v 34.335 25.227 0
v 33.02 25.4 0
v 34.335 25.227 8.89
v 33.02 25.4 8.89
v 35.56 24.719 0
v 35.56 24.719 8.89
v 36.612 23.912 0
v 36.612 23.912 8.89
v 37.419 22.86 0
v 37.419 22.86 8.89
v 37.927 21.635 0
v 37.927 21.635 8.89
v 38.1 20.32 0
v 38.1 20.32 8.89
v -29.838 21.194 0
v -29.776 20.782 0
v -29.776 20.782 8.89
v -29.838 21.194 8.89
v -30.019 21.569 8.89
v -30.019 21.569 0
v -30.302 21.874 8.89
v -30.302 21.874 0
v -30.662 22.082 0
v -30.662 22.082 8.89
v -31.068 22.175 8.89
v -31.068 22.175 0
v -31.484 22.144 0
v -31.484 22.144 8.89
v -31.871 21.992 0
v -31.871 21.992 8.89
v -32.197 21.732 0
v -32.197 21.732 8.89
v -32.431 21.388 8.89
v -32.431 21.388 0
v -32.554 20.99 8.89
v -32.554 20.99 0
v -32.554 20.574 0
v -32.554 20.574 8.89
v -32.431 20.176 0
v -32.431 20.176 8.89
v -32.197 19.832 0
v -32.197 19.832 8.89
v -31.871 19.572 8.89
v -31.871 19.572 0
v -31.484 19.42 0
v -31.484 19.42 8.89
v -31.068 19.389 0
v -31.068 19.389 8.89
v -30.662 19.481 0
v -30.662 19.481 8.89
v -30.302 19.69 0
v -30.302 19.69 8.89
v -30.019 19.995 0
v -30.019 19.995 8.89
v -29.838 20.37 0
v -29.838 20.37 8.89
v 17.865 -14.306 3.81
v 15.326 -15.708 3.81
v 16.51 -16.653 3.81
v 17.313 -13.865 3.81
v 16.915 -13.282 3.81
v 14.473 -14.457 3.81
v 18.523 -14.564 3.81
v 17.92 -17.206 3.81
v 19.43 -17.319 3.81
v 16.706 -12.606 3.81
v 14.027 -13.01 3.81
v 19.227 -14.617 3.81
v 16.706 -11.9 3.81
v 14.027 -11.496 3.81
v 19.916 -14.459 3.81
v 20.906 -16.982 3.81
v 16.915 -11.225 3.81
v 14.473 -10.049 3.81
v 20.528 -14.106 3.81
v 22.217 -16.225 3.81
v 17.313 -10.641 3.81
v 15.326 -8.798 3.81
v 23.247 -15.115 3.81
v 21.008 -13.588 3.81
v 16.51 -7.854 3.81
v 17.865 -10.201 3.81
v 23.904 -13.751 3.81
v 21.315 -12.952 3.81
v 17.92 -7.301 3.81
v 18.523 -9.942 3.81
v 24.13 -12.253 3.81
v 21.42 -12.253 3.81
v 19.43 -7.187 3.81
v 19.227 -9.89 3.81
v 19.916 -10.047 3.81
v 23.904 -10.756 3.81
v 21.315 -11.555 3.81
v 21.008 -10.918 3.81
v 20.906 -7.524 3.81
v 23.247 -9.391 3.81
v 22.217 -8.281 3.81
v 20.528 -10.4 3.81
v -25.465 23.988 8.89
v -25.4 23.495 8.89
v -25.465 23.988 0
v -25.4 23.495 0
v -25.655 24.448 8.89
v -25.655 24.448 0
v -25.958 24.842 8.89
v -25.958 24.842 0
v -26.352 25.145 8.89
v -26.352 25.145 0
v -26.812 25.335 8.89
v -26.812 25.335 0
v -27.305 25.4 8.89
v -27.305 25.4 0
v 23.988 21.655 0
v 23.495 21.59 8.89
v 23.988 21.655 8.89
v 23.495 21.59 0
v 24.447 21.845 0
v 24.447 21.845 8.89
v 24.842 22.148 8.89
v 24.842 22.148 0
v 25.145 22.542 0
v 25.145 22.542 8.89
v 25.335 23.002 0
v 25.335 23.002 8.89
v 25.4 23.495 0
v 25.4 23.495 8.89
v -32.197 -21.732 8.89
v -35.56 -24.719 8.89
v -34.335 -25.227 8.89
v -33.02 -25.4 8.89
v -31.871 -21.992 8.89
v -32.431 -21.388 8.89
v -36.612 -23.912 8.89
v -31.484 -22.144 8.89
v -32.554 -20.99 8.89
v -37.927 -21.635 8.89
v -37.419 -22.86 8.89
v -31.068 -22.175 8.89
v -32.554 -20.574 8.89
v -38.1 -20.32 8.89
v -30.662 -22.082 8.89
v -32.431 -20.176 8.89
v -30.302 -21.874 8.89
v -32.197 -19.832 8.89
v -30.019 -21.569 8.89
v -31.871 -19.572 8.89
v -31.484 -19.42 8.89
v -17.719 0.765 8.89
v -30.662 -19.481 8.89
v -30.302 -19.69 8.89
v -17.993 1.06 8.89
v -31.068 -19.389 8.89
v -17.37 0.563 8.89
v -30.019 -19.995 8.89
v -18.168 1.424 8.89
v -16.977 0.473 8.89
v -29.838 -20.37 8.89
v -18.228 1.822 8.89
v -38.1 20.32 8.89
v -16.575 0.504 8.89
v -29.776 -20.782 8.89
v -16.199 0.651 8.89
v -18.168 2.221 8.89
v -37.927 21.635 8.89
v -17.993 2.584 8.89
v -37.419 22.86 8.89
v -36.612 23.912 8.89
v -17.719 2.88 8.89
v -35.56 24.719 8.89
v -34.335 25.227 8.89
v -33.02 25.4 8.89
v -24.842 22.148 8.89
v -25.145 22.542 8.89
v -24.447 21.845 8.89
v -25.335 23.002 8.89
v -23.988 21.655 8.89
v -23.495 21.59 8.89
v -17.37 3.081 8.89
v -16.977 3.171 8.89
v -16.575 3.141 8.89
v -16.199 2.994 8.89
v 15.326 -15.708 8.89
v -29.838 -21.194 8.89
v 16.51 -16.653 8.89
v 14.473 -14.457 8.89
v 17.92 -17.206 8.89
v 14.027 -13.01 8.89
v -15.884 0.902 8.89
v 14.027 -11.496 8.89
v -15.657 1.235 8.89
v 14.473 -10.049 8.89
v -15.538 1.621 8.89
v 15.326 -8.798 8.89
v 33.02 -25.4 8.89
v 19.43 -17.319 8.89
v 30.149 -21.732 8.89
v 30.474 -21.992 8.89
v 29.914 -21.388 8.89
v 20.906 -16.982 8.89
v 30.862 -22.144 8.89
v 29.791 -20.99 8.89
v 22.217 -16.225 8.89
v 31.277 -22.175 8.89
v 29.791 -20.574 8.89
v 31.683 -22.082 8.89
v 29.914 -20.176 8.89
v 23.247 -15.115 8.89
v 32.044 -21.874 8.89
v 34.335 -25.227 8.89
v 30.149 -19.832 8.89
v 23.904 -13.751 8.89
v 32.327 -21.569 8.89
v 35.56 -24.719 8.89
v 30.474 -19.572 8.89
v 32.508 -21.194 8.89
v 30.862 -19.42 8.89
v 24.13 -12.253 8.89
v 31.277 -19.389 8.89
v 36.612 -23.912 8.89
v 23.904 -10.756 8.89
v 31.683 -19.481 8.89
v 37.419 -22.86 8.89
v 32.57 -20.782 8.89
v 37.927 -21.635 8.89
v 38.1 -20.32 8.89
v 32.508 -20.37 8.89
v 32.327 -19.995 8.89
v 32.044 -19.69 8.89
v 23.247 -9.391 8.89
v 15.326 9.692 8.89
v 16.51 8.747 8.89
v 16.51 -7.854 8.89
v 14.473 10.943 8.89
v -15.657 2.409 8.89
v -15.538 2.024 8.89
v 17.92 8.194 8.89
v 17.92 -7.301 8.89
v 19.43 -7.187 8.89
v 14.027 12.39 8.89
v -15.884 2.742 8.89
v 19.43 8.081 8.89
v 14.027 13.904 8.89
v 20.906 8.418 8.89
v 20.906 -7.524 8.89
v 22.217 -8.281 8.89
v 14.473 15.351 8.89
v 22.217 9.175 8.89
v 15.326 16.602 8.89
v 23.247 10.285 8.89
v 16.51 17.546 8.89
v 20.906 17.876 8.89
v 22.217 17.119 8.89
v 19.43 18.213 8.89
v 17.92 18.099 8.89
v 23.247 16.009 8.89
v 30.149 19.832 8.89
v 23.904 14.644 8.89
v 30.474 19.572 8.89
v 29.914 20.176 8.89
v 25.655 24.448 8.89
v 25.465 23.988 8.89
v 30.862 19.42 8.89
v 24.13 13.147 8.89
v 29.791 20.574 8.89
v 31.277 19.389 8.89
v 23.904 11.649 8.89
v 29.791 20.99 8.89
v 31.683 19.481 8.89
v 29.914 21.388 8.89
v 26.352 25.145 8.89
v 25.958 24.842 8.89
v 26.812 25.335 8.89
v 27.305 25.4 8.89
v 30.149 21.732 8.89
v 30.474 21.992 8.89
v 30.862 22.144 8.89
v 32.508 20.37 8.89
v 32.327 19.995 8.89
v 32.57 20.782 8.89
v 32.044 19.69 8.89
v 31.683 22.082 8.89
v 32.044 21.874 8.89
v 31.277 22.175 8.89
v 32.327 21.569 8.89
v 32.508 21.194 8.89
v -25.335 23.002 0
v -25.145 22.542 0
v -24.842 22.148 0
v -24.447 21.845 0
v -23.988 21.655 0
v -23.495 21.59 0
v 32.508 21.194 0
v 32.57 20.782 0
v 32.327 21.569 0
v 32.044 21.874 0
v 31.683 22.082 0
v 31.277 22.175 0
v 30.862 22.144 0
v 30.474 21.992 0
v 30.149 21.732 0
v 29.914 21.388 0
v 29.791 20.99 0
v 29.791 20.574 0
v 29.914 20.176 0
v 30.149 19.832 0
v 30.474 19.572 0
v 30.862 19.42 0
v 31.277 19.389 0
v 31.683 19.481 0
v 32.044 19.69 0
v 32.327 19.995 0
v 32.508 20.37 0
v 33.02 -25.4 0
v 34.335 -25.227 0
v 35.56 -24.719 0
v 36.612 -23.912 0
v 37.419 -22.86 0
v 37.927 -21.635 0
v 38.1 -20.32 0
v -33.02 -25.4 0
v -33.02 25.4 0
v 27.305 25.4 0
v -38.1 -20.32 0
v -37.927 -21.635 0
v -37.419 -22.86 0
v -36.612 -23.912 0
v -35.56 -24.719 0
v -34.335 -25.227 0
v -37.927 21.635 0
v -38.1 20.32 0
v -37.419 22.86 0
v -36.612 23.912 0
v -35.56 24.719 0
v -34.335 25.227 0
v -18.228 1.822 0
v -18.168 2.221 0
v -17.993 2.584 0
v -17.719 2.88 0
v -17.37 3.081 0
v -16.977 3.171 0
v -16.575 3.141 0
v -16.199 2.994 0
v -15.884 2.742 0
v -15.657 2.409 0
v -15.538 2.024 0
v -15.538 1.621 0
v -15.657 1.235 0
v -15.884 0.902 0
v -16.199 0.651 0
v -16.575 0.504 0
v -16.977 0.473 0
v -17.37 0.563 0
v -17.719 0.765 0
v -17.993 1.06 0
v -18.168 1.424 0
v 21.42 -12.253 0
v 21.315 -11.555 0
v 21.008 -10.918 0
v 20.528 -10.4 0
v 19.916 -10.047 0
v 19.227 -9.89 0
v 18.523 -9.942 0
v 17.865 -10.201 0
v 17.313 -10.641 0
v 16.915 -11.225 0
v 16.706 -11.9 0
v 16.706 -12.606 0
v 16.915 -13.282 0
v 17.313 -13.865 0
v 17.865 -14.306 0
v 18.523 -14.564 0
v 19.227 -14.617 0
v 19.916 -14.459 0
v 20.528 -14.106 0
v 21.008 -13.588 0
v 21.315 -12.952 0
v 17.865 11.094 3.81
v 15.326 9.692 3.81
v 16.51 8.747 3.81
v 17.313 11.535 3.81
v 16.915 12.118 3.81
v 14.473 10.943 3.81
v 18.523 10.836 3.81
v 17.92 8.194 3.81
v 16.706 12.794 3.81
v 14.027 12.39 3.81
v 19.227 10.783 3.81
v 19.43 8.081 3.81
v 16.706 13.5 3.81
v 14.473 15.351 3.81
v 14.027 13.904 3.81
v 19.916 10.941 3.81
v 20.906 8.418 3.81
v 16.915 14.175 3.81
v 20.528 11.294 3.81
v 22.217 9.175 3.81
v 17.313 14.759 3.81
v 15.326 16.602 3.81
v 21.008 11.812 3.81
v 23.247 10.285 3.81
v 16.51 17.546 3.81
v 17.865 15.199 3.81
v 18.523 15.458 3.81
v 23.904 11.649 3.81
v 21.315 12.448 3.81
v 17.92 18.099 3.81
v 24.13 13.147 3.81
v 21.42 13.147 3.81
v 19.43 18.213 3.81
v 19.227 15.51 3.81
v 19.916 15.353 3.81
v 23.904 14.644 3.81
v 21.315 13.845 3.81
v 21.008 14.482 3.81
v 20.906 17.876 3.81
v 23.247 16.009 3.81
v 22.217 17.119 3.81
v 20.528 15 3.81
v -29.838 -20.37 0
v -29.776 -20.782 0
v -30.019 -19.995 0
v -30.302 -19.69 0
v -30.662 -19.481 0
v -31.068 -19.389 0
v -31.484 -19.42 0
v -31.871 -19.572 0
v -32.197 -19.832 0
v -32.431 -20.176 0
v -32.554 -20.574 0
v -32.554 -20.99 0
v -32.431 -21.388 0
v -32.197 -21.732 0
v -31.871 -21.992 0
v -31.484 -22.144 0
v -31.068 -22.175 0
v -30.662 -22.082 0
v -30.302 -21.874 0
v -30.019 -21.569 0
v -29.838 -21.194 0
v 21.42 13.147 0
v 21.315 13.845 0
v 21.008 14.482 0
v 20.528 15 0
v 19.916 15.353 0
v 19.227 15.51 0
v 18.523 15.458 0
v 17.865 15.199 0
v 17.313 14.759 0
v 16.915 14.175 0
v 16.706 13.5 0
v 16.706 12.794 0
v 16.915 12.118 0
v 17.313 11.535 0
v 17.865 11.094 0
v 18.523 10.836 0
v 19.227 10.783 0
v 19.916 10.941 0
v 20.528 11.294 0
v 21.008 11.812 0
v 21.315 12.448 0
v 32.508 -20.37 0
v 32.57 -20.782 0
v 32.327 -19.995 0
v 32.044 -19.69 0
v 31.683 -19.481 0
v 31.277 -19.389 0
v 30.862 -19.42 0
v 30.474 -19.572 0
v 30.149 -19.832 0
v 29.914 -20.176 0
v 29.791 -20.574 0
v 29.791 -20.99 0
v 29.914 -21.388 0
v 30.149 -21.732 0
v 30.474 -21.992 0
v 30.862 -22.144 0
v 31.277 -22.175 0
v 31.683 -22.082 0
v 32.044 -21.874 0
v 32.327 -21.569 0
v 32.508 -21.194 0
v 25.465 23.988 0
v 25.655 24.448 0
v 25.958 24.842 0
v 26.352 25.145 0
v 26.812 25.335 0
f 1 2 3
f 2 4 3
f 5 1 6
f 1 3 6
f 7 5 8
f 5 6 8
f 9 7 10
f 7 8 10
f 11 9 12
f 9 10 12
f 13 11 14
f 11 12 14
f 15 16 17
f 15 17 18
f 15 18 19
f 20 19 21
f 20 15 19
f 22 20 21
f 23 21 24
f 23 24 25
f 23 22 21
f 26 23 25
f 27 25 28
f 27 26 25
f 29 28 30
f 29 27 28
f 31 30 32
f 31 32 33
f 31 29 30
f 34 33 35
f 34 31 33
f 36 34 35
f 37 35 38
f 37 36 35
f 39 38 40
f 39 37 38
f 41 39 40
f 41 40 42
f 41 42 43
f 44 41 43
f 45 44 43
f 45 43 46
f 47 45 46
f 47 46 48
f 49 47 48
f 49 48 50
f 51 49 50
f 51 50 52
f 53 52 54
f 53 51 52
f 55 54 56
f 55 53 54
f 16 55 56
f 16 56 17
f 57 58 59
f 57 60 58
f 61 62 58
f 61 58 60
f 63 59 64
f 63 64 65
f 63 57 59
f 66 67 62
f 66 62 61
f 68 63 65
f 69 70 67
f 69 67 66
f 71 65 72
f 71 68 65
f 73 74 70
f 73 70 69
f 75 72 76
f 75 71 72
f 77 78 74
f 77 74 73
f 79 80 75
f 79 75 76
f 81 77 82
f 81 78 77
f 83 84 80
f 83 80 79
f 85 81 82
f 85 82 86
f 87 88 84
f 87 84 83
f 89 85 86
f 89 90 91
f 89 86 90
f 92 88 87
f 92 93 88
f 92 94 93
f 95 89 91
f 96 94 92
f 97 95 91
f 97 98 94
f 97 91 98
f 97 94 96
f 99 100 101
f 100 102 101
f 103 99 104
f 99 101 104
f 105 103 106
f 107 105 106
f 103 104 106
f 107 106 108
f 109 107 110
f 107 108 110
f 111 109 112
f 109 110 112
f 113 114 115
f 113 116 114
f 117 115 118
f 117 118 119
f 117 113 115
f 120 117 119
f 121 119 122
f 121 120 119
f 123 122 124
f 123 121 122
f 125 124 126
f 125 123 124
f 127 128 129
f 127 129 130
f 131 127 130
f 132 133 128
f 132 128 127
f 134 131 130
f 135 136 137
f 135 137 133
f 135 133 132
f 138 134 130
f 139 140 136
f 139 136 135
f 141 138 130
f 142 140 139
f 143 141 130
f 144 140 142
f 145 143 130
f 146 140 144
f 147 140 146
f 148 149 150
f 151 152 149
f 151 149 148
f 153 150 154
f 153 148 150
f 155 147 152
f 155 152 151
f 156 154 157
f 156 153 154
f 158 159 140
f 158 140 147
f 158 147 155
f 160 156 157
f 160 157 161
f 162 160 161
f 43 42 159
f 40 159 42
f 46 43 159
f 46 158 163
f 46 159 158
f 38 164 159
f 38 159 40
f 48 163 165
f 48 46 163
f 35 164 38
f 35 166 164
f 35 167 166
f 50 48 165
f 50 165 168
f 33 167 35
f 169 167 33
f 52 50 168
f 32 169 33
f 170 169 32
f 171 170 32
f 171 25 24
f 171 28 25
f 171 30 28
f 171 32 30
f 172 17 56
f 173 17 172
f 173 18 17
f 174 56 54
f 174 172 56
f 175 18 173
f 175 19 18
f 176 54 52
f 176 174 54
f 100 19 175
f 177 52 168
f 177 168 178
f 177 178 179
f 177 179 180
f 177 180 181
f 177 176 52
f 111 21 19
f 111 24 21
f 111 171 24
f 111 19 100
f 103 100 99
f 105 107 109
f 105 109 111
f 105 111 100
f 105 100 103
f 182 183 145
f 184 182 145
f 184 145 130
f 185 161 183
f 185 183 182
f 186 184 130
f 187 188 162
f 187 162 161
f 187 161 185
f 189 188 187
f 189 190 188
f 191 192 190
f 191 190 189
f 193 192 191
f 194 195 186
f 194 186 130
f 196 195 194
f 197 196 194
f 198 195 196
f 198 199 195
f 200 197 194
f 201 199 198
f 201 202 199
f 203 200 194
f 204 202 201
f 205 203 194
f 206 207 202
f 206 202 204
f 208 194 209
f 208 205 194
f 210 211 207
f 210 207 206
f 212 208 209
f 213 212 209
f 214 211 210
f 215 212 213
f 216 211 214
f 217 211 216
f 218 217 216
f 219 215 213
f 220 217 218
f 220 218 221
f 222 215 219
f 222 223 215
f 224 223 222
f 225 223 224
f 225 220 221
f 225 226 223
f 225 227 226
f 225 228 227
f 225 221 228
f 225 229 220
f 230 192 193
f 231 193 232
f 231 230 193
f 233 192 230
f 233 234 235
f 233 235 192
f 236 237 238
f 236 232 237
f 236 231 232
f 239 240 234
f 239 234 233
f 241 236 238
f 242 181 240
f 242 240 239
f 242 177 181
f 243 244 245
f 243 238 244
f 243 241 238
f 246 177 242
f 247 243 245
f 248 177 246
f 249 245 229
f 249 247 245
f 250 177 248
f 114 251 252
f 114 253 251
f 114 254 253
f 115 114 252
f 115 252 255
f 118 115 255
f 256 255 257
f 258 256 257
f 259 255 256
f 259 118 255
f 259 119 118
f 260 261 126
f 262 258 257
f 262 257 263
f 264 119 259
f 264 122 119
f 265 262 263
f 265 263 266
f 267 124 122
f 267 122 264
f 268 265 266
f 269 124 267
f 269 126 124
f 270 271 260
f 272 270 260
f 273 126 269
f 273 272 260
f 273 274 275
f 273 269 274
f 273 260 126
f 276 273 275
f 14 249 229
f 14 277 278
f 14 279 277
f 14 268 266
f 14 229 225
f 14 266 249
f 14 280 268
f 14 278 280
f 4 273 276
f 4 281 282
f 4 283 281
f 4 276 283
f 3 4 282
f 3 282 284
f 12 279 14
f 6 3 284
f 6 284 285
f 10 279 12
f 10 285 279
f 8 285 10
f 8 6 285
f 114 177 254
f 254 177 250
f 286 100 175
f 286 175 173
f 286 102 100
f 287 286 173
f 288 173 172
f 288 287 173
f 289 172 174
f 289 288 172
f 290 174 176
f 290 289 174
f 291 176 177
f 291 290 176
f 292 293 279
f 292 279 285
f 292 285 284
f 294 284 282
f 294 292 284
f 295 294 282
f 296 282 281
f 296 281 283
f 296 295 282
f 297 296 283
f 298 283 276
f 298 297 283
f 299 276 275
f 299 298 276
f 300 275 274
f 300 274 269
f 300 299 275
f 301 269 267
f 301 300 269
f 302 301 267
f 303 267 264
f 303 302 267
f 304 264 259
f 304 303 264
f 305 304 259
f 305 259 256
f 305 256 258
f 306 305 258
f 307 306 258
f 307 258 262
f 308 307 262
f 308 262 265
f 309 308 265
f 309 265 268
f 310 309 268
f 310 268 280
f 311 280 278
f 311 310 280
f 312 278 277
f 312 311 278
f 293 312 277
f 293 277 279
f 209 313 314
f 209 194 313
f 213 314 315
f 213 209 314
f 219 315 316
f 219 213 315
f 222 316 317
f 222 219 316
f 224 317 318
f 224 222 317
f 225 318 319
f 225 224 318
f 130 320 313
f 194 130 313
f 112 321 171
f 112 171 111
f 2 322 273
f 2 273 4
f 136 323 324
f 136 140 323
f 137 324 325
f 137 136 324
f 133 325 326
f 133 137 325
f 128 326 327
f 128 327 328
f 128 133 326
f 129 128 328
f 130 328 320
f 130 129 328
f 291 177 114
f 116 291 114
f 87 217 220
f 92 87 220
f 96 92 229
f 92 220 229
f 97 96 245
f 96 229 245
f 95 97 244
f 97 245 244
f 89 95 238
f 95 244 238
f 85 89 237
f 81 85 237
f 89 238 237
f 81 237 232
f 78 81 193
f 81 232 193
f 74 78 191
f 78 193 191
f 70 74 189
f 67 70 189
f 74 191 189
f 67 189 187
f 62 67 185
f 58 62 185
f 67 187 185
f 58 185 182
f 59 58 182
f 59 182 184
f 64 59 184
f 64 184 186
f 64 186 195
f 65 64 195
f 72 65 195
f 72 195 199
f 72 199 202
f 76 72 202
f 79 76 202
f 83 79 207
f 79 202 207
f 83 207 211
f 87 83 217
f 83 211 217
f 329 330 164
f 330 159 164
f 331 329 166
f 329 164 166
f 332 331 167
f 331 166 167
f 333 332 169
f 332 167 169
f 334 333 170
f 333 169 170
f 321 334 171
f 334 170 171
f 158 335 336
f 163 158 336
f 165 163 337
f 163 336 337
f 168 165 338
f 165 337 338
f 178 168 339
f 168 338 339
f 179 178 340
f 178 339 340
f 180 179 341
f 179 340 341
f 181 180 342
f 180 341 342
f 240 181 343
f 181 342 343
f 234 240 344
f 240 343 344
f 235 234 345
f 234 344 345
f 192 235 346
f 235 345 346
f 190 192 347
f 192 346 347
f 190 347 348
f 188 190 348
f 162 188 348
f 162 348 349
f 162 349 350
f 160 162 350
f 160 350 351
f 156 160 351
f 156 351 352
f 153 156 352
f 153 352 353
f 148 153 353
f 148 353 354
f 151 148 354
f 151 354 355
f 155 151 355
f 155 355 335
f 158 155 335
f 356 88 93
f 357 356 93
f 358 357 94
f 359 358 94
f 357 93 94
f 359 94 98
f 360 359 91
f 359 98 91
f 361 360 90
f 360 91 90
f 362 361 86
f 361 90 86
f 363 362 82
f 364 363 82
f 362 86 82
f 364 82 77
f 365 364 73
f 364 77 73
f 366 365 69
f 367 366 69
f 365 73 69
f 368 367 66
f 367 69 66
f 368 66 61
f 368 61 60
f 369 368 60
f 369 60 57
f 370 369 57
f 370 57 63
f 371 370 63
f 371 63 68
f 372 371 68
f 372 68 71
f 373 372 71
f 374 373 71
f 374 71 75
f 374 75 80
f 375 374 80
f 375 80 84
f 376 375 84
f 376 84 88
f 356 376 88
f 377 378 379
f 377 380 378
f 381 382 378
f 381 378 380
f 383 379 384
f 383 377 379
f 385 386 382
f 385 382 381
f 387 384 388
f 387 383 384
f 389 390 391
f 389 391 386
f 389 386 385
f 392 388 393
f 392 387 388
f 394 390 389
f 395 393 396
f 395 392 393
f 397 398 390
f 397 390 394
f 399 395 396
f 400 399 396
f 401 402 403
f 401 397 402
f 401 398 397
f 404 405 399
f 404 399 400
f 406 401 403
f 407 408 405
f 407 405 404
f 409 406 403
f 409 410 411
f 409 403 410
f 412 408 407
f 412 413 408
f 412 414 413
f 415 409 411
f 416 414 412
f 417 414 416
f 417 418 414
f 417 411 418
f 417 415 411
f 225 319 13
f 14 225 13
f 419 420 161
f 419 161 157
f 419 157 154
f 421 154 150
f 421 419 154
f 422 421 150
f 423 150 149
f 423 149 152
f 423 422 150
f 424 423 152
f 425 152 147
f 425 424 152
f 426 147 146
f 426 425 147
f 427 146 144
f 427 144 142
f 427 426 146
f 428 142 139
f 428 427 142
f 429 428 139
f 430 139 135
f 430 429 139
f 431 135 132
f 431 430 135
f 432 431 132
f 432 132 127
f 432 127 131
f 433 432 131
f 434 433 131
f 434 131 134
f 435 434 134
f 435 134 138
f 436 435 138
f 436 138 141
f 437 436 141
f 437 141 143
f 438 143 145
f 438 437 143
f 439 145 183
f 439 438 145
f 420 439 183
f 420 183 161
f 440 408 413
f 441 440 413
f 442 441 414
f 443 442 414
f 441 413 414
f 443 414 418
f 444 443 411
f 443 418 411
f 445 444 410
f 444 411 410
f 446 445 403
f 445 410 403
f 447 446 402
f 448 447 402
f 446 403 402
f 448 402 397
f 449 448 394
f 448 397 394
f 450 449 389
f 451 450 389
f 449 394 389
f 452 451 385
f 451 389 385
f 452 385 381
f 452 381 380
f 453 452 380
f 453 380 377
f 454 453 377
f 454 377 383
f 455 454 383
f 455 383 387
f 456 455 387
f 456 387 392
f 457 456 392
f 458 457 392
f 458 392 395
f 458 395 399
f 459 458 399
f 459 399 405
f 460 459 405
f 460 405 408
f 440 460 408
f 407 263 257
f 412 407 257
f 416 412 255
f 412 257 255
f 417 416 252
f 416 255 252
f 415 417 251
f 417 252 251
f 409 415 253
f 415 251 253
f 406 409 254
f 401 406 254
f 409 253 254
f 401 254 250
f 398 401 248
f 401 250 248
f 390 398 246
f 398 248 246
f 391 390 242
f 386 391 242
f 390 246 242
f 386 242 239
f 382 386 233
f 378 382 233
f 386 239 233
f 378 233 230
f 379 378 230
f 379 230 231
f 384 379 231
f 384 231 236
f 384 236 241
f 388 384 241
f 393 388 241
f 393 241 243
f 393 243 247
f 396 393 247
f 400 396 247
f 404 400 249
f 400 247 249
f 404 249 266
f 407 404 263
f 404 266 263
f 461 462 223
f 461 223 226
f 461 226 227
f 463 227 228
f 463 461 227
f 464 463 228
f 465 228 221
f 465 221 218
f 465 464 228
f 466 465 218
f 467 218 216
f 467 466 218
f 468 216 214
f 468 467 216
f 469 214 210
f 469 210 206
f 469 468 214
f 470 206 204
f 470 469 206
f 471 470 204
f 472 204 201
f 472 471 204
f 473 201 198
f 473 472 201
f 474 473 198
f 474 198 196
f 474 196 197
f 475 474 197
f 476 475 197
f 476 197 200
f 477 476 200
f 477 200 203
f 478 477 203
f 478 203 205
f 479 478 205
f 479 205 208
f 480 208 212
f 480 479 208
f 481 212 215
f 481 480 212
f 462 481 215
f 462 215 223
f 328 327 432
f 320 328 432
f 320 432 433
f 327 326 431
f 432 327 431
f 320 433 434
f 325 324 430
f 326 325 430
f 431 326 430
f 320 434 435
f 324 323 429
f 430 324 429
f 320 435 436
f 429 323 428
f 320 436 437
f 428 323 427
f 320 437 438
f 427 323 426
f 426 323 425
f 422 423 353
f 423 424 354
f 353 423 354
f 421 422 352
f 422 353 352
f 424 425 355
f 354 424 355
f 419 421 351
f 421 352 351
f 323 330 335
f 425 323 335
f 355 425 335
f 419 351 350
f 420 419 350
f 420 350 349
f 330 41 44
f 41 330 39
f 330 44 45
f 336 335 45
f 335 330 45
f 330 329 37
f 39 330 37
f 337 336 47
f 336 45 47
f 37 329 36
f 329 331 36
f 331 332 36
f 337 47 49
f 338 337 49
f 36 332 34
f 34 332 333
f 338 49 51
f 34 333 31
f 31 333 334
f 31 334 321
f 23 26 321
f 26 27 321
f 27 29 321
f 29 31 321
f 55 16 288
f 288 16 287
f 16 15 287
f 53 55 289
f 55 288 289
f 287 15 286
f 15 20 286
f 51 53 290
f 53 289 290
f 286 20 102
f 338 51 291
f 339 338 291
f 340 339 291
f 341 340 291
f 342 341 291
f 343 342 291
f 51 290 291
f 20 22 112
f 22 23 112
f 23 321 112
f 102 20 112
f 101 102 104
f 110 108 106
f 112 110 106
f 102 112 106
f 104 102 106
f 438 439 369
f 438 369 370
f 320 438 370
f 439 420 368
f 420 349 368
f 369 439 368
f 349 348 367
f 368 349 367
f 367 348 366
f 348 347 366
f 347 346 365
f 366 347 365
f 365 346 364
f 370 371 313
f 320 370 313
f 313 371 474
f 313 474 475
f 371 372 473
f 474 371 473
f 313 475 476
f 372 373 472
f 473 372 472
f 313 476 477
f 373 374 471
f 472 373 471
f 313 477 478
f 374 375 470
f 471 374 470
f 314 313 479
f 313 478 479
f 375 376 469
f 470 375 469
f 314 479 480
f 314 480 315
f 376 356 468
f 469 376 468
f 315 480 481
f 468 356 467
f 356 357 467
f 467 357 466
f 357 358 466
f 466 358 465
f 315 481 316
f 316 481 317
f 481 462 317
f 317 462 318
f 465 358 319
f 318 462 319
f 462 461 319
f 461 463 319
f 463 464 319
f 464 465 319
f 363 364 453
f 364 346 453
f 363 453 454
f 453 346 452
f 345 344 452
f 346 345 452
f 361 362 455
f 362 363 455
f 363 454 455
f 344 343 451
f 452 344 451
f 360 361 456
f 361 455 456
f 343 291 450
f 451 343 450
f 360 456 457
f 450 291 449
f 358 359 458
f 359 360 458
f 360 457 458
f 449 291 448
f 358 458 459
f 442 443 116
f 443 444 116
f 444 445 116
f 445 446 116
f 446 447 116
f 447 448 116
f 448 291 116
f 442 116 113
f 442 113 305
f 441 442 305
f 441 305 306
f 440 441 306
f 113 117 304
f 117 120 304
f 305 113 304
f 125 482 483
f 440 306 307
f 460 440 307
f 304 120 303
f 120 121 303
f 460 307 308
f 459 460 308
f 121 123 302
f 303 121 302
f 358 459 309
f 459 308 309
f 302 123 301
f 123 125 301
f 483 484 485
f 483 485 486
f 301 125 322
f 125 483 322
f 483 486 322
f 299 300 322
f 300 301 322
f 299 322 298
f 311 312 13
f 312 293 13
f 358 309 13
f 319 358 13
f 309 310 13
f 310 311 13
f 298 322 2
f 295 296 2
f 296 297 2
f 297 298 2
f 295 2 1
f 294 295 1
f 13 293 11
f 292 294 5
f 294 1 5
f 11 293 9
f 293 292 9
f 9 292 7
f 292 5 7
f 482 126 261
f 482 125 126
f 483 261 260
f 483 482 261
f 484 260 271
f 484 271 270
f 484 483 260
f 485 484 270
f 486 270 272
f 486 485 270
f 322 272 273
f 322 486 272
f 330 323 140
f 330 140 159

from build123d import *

# Parameters (mm, degrees)
SKETCH1_W             = 76.2
SKETCH1_H             = 50.8
SKETCH1_R             = 1.397
BOSS_EXTRUDE1_DEPTH   = 8.89
FILLET1_R             = 5.08
SKETCH2_R             = 2.370137615
CUT_EXTRUDE1_DEPTH    = 47.645493887
SKETCH3_R             = 5.08
CUT_EXTRUDE2_DEPTH    = 5.08
SKETCH4_W             = 50.8
SKETCH4_H             = 3.81
CUT_EXTRUDE3_DEPTH    = 47.645493887
FILLET2_R             = 1.905
F_6_32_TAPPED_HOLE1_D = 2.7051


with BuildPart() as part:
    # Sketch1 → Boss-Extrude1 (new body)
    with BuildSketch(Plane.XY):
        Rectangle(SKETCH1_W, SKETCH1_H)
        with Locations((-31.172764277, -20.781842852)):
            Circle(SKETCH1_R, mode=Mode.SUBTRACT)
        with Locations((31.172764277, 20.781842852)):
            Circle(SKETCH1_R, mode=Mode.SUBTRACT)
        with Locations((-31.172764277, 20.781842852)):
            Circle(SKETCH1_R, mode=Mode.SUBTRACT)
        with Locations((31.172764277, -20.781842852)):
            Circle(SKETCH1_R, mode=Mode.SUBTRACT)
    extrude(amount=BOSS_EXTRUDE1_DEPTH)

    # Fillet1
    fillet1_edges = [part.edges().sort_by_distance(p)[0] for p in [
        (38.1, -25.4, 4.445),
        (-38.1, -25.4, 4.445),
        (-38.1, 25.4, 4.445),
        (38.1, 25.4, 4.445),
    ]]
    fillet(fillet1_edges, radius=FILLET1_R)

    # Sketch2 → Cut-Extrude1 (cut, through all)
    with BuildSketch(Plane.XY.offset(8.89)):
        with Locations((19.05, 13.146852544)):
            Circle(SKETCH2_R)
        with Locations((19.05, -12.253147456)):
            Circle(SKETCH2_R)
    extrude(amount=-CUT_EXTRUDE1_DEPTH, mode=Mode.SUBTRACT)

    # Sketch3 → Cut-Extrude2 (cut)
    with BuildSketch(Plane.XY.offset(8.89)):
        with Locations((19.05, 13.146852544)):
            Circle(SKETCH3_R)
        with Locations((19.05, -12.253147456)):
            Circle(SKETCH3_R)
    extrude(amount=-CUT_EXTRUDE2_DEPTH, mode=Mode.SUBTRACT)

    # Sketch4 → Cut-Extrude3 (cut, through all)
    with BuildSketch(Plane.XY.offset(8.89)):
        with Locations((0, 23.495)):
            Rectangle(SKETCH4_W, SKETCH4_H)
    extrude(amount=-CUT_EXTRUDE3_DEPTH, mode=Mode.SUBTRACT)

    # Fillet2
    fillet2_edges = [part.edges().sort_by_distance(p)[0] for p in [
        (25.4, 21.59, 4.445),
        (-25.4, 21.59, 4.445),
    ]]
    fillet(fillet2_edges, radius=FILLET2_R)
    fillet2_2_edges = [part.edges().sort_by_distance(p)[0] for p in [
        (25.4, 25.4, 4.445),
        (-25.4, 25.4, 4.445),
    ]]
    fillet(fillet2_2_edges, radius=FILLET2_R - 0.0001)  # a hair under: the kernel refuses the full size

    # #6-32 Tapped Hole1 (through all)
    with Locations(Plane.XY.offset(8.89)):
        with Locations((-16.875568399, 1.822244587)):
            Hole(F_6_32_TAPPED_HOLE1_D / 2)


solid = part.part
